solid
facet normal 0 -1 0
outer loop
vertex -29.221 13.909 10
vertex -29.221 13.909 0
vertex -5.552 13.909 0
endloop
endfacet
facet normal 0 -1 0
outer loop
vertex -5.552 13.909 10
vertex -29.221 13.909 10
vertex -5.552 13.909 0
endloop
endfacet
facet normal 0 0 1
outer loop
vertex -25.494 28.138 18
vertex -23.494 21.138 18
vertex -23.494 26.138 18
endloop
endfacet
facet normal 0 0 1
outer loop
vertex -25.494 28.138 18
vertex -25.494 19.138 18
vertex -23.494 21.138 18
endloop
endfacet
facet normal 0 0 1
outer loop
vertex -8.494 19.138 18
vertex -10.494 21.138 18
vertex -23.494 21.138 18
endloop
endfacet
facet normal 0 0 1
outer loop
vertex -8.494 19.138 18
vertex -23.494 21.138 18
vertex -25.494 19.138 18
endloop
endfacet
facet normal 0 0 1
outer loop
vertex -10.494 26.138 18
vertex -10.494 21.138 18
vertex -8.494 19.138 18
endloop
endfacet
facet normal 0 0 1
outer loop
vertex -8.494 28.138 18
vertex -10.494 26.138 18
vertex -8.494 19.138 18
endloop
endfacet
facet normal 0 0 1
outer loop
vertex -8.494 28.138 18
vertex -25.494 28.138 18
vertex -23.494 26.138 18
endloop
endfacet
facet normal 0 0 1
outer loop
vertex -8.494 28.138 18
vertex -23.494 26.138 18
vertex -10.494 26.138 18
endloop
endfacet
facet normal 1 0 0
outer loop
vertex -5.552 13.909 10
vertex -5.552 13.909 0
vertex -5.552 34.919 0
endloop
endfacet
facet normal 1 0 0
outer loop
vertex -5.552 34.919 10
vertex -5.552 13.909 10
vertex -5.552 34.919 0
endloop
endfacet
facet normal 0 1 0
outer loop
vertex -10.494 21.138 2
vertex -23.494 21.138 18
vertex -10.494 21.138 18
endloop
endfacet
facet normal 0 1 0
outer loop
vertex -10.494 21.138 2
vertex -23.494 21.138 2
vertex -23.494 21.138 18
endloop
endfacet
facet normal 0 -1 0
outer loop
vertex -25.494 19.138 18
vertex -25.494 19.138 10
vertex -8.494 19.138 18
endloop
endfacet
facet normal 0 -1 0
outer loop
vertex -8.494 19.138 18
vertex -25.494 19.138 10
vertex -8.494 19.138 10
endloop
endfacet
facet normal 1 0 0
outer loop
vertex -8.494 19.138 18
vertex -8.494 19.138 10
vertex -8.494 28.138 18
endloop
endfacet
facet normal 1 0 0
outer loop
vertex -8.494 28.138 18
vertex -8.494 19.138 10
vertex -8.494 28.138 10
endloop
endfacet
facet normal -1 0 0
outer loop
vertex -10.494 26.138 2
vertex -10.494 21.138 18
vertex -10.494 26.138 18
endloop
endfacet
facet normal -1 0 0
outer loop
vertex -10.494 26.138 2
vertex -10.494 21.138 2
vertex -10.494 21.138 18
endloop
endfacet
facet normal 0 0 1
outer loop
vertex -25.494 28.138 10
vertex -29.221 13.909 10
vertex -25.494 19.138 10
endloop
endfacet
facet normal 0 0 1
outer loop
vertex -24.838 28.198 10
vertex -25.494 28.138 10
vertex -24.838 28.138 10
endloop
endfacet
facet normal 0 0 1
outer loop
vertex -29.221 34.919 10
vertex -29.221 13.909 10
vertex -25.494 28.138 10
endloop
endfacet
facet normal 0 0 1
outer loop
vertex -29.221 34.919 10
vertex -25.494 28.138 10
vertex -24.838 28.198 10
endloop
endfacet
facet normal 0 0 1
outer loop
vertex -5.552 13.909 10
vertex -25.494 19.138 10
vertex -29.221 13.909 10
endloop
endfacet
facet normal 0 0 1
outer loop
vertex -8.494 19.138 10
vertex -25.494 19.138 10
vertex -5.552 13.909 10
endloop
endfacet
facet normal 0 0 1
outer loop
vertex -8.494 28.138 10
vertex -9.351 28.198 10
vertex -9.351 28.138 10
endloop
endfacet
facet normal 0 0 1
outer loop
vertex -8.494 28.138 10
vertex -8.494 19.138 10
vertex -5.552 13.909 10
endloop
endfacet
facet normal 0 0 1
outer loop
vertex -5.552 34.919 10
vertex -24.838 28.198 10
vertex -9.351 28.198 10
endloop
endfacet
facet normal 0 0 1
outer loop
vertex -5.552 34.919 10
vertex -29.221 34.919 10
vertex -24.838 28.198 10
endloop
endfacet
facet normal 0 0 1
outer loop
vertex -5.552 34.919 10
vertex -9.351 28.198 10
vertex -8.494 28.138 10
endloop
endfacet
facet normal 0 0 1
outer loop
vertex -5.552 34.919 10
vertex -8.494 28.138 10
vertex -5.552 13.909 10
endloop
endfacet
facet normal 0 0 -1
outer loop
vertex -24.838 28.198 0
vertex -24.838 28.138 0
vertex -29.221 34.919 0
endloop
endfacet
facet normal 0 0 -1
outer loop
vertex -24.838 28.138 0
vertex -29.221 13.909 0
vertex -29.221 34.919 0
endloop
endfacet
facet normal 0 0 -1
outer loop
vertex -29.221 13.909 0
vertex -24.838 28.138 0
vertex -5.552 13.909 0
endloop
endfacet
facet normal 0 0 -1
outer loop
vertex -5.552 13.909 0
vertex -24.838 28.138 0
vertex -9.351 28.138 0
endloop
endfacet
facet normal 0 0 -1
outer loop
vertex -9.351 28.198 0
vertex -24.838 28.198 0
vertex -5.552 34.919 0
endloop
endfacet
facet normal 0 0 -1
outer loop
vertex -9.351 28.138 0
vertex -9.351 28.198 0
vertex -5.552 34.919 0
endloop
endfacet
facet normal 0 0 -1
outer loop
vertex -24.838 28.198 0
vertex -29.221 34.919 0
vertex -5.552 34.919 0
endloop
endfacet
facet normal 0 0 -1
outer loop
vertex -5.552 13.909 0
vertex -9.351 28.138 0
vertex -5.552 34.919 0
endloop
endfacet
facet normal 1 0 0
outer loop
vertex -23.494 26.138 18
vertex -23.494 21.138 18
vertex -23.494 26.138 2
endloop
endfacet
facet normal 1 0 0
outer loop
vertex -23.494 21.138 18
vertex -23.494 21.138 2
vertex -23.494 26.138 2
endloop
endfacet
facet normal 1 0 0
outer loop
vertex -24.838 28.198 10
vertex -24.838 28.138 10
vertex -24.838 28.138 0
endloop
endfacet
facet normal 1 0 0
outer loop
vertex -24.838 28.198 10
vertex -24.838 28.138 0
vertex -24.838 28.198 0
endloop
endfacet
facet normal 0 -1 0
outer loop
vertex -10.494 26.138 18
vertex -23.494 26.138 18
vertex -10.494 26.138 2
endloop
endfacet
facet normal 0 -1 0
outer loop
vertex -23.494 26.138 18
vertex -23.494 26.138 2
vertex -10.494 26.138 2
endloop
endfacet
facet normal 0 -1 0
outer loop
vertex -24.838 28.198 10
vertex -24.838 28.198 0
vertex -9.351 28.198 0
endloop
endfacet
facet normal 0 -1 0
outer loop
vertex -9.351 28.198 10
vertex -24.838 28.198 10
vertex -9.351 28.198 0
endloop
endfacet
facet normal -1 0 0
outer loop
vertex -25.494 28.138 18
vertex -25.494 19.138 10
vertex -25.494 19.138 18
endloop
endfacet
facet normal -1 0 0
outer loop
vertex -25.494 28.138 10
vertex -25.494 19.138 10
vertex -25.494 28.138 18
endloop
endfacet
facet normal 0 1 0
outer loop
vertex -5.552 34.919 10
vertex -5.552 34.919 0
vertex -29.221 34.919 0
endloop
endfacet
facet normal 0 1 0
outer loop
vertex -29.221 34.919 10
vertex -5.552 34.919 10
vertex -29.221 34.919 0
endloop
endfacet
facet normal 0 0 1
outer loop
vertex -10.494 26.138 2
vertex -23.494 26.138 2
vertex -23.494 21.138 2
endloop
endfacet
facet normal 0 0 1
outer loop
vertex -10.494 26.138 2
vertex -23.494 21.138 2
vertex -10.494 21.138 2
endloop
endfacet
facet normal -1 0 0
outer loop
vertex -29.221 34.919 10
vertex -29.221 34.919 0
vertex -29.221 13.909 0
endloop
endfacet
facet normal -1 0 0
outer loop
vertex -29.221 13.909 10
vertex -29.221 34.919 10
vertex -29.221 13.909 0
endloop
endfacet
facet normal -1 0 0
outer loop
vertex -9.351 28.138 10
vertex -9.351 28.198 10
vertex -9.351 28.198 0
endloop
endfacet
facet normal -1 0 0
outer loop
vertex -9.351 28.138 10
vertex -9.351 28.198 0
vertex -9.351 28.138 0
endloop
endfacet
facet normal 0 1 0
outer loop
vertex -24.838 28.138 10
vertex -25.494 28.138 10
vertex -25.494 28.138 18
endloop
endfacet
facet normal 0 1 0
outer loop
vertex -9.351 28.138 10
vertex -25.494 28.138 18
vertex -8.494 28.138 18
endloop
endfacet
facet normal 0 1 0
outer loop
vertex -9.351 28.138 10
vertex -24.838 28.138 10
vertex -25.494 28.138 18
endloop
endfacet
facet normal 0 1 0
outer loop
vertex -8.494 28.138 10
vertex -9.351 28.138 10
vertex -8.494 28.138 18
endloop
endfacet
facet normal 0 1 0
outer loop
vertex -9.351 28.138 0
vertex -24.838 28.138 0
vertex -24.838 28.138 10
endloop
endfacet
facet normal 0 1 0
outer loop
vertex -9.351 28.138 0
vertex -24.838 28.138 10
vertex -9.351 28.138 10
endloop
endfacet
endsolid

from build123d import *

# Parameters (mm, degrees)
F0_W     = 17
F0_H     = 9
F1_DEPTH = 18
F2_T     = -2
F4_DEPTH = 10


with BuildPart() as f1:
    # F0 (on Top) → F1 (new body)
    with BuildSketch(Plane.XY):
        with Locations((-16.993507, 23.638348)):
            Rectangle(F0_W, F0_H)
    extrude(amount=F1_DEPTH)

    # F2
    f2_openings = [f1.faces().sort_by_distance(p)[0] for p in [
        (-16.993507, 23.638348, 18),
    ]]
    offset(amount=F2_T, openings=f2_openings)

    # F3 (on Top) → F4 (join)
    with BuildSketch(Plane.XY):
        Polygon((-24.837663, 19.885201), (-24.837663, 23.537122), (-29.22078, 23.537122), (-29.22078, 13.90854), (-5.551947, 13.90854), (-5.551947, 23.537122), (-9.35065, 23.537122), (-9.457072, 19.885201), align=None)
        Polygon((-29.22078, 23.537122), (-24.837663, 23.537122), (-24.837663, 28.198052), (-9.35065, 28.198052), (-9.35065, 23.537122), (-5.551947, 23.537122), (-5.551947, 34.918834), (-29.22078, 34.918834), (-29.22078, 28.198052), align=None)
    extrude(amount=F4_DEPTH)


solid = f1.part
